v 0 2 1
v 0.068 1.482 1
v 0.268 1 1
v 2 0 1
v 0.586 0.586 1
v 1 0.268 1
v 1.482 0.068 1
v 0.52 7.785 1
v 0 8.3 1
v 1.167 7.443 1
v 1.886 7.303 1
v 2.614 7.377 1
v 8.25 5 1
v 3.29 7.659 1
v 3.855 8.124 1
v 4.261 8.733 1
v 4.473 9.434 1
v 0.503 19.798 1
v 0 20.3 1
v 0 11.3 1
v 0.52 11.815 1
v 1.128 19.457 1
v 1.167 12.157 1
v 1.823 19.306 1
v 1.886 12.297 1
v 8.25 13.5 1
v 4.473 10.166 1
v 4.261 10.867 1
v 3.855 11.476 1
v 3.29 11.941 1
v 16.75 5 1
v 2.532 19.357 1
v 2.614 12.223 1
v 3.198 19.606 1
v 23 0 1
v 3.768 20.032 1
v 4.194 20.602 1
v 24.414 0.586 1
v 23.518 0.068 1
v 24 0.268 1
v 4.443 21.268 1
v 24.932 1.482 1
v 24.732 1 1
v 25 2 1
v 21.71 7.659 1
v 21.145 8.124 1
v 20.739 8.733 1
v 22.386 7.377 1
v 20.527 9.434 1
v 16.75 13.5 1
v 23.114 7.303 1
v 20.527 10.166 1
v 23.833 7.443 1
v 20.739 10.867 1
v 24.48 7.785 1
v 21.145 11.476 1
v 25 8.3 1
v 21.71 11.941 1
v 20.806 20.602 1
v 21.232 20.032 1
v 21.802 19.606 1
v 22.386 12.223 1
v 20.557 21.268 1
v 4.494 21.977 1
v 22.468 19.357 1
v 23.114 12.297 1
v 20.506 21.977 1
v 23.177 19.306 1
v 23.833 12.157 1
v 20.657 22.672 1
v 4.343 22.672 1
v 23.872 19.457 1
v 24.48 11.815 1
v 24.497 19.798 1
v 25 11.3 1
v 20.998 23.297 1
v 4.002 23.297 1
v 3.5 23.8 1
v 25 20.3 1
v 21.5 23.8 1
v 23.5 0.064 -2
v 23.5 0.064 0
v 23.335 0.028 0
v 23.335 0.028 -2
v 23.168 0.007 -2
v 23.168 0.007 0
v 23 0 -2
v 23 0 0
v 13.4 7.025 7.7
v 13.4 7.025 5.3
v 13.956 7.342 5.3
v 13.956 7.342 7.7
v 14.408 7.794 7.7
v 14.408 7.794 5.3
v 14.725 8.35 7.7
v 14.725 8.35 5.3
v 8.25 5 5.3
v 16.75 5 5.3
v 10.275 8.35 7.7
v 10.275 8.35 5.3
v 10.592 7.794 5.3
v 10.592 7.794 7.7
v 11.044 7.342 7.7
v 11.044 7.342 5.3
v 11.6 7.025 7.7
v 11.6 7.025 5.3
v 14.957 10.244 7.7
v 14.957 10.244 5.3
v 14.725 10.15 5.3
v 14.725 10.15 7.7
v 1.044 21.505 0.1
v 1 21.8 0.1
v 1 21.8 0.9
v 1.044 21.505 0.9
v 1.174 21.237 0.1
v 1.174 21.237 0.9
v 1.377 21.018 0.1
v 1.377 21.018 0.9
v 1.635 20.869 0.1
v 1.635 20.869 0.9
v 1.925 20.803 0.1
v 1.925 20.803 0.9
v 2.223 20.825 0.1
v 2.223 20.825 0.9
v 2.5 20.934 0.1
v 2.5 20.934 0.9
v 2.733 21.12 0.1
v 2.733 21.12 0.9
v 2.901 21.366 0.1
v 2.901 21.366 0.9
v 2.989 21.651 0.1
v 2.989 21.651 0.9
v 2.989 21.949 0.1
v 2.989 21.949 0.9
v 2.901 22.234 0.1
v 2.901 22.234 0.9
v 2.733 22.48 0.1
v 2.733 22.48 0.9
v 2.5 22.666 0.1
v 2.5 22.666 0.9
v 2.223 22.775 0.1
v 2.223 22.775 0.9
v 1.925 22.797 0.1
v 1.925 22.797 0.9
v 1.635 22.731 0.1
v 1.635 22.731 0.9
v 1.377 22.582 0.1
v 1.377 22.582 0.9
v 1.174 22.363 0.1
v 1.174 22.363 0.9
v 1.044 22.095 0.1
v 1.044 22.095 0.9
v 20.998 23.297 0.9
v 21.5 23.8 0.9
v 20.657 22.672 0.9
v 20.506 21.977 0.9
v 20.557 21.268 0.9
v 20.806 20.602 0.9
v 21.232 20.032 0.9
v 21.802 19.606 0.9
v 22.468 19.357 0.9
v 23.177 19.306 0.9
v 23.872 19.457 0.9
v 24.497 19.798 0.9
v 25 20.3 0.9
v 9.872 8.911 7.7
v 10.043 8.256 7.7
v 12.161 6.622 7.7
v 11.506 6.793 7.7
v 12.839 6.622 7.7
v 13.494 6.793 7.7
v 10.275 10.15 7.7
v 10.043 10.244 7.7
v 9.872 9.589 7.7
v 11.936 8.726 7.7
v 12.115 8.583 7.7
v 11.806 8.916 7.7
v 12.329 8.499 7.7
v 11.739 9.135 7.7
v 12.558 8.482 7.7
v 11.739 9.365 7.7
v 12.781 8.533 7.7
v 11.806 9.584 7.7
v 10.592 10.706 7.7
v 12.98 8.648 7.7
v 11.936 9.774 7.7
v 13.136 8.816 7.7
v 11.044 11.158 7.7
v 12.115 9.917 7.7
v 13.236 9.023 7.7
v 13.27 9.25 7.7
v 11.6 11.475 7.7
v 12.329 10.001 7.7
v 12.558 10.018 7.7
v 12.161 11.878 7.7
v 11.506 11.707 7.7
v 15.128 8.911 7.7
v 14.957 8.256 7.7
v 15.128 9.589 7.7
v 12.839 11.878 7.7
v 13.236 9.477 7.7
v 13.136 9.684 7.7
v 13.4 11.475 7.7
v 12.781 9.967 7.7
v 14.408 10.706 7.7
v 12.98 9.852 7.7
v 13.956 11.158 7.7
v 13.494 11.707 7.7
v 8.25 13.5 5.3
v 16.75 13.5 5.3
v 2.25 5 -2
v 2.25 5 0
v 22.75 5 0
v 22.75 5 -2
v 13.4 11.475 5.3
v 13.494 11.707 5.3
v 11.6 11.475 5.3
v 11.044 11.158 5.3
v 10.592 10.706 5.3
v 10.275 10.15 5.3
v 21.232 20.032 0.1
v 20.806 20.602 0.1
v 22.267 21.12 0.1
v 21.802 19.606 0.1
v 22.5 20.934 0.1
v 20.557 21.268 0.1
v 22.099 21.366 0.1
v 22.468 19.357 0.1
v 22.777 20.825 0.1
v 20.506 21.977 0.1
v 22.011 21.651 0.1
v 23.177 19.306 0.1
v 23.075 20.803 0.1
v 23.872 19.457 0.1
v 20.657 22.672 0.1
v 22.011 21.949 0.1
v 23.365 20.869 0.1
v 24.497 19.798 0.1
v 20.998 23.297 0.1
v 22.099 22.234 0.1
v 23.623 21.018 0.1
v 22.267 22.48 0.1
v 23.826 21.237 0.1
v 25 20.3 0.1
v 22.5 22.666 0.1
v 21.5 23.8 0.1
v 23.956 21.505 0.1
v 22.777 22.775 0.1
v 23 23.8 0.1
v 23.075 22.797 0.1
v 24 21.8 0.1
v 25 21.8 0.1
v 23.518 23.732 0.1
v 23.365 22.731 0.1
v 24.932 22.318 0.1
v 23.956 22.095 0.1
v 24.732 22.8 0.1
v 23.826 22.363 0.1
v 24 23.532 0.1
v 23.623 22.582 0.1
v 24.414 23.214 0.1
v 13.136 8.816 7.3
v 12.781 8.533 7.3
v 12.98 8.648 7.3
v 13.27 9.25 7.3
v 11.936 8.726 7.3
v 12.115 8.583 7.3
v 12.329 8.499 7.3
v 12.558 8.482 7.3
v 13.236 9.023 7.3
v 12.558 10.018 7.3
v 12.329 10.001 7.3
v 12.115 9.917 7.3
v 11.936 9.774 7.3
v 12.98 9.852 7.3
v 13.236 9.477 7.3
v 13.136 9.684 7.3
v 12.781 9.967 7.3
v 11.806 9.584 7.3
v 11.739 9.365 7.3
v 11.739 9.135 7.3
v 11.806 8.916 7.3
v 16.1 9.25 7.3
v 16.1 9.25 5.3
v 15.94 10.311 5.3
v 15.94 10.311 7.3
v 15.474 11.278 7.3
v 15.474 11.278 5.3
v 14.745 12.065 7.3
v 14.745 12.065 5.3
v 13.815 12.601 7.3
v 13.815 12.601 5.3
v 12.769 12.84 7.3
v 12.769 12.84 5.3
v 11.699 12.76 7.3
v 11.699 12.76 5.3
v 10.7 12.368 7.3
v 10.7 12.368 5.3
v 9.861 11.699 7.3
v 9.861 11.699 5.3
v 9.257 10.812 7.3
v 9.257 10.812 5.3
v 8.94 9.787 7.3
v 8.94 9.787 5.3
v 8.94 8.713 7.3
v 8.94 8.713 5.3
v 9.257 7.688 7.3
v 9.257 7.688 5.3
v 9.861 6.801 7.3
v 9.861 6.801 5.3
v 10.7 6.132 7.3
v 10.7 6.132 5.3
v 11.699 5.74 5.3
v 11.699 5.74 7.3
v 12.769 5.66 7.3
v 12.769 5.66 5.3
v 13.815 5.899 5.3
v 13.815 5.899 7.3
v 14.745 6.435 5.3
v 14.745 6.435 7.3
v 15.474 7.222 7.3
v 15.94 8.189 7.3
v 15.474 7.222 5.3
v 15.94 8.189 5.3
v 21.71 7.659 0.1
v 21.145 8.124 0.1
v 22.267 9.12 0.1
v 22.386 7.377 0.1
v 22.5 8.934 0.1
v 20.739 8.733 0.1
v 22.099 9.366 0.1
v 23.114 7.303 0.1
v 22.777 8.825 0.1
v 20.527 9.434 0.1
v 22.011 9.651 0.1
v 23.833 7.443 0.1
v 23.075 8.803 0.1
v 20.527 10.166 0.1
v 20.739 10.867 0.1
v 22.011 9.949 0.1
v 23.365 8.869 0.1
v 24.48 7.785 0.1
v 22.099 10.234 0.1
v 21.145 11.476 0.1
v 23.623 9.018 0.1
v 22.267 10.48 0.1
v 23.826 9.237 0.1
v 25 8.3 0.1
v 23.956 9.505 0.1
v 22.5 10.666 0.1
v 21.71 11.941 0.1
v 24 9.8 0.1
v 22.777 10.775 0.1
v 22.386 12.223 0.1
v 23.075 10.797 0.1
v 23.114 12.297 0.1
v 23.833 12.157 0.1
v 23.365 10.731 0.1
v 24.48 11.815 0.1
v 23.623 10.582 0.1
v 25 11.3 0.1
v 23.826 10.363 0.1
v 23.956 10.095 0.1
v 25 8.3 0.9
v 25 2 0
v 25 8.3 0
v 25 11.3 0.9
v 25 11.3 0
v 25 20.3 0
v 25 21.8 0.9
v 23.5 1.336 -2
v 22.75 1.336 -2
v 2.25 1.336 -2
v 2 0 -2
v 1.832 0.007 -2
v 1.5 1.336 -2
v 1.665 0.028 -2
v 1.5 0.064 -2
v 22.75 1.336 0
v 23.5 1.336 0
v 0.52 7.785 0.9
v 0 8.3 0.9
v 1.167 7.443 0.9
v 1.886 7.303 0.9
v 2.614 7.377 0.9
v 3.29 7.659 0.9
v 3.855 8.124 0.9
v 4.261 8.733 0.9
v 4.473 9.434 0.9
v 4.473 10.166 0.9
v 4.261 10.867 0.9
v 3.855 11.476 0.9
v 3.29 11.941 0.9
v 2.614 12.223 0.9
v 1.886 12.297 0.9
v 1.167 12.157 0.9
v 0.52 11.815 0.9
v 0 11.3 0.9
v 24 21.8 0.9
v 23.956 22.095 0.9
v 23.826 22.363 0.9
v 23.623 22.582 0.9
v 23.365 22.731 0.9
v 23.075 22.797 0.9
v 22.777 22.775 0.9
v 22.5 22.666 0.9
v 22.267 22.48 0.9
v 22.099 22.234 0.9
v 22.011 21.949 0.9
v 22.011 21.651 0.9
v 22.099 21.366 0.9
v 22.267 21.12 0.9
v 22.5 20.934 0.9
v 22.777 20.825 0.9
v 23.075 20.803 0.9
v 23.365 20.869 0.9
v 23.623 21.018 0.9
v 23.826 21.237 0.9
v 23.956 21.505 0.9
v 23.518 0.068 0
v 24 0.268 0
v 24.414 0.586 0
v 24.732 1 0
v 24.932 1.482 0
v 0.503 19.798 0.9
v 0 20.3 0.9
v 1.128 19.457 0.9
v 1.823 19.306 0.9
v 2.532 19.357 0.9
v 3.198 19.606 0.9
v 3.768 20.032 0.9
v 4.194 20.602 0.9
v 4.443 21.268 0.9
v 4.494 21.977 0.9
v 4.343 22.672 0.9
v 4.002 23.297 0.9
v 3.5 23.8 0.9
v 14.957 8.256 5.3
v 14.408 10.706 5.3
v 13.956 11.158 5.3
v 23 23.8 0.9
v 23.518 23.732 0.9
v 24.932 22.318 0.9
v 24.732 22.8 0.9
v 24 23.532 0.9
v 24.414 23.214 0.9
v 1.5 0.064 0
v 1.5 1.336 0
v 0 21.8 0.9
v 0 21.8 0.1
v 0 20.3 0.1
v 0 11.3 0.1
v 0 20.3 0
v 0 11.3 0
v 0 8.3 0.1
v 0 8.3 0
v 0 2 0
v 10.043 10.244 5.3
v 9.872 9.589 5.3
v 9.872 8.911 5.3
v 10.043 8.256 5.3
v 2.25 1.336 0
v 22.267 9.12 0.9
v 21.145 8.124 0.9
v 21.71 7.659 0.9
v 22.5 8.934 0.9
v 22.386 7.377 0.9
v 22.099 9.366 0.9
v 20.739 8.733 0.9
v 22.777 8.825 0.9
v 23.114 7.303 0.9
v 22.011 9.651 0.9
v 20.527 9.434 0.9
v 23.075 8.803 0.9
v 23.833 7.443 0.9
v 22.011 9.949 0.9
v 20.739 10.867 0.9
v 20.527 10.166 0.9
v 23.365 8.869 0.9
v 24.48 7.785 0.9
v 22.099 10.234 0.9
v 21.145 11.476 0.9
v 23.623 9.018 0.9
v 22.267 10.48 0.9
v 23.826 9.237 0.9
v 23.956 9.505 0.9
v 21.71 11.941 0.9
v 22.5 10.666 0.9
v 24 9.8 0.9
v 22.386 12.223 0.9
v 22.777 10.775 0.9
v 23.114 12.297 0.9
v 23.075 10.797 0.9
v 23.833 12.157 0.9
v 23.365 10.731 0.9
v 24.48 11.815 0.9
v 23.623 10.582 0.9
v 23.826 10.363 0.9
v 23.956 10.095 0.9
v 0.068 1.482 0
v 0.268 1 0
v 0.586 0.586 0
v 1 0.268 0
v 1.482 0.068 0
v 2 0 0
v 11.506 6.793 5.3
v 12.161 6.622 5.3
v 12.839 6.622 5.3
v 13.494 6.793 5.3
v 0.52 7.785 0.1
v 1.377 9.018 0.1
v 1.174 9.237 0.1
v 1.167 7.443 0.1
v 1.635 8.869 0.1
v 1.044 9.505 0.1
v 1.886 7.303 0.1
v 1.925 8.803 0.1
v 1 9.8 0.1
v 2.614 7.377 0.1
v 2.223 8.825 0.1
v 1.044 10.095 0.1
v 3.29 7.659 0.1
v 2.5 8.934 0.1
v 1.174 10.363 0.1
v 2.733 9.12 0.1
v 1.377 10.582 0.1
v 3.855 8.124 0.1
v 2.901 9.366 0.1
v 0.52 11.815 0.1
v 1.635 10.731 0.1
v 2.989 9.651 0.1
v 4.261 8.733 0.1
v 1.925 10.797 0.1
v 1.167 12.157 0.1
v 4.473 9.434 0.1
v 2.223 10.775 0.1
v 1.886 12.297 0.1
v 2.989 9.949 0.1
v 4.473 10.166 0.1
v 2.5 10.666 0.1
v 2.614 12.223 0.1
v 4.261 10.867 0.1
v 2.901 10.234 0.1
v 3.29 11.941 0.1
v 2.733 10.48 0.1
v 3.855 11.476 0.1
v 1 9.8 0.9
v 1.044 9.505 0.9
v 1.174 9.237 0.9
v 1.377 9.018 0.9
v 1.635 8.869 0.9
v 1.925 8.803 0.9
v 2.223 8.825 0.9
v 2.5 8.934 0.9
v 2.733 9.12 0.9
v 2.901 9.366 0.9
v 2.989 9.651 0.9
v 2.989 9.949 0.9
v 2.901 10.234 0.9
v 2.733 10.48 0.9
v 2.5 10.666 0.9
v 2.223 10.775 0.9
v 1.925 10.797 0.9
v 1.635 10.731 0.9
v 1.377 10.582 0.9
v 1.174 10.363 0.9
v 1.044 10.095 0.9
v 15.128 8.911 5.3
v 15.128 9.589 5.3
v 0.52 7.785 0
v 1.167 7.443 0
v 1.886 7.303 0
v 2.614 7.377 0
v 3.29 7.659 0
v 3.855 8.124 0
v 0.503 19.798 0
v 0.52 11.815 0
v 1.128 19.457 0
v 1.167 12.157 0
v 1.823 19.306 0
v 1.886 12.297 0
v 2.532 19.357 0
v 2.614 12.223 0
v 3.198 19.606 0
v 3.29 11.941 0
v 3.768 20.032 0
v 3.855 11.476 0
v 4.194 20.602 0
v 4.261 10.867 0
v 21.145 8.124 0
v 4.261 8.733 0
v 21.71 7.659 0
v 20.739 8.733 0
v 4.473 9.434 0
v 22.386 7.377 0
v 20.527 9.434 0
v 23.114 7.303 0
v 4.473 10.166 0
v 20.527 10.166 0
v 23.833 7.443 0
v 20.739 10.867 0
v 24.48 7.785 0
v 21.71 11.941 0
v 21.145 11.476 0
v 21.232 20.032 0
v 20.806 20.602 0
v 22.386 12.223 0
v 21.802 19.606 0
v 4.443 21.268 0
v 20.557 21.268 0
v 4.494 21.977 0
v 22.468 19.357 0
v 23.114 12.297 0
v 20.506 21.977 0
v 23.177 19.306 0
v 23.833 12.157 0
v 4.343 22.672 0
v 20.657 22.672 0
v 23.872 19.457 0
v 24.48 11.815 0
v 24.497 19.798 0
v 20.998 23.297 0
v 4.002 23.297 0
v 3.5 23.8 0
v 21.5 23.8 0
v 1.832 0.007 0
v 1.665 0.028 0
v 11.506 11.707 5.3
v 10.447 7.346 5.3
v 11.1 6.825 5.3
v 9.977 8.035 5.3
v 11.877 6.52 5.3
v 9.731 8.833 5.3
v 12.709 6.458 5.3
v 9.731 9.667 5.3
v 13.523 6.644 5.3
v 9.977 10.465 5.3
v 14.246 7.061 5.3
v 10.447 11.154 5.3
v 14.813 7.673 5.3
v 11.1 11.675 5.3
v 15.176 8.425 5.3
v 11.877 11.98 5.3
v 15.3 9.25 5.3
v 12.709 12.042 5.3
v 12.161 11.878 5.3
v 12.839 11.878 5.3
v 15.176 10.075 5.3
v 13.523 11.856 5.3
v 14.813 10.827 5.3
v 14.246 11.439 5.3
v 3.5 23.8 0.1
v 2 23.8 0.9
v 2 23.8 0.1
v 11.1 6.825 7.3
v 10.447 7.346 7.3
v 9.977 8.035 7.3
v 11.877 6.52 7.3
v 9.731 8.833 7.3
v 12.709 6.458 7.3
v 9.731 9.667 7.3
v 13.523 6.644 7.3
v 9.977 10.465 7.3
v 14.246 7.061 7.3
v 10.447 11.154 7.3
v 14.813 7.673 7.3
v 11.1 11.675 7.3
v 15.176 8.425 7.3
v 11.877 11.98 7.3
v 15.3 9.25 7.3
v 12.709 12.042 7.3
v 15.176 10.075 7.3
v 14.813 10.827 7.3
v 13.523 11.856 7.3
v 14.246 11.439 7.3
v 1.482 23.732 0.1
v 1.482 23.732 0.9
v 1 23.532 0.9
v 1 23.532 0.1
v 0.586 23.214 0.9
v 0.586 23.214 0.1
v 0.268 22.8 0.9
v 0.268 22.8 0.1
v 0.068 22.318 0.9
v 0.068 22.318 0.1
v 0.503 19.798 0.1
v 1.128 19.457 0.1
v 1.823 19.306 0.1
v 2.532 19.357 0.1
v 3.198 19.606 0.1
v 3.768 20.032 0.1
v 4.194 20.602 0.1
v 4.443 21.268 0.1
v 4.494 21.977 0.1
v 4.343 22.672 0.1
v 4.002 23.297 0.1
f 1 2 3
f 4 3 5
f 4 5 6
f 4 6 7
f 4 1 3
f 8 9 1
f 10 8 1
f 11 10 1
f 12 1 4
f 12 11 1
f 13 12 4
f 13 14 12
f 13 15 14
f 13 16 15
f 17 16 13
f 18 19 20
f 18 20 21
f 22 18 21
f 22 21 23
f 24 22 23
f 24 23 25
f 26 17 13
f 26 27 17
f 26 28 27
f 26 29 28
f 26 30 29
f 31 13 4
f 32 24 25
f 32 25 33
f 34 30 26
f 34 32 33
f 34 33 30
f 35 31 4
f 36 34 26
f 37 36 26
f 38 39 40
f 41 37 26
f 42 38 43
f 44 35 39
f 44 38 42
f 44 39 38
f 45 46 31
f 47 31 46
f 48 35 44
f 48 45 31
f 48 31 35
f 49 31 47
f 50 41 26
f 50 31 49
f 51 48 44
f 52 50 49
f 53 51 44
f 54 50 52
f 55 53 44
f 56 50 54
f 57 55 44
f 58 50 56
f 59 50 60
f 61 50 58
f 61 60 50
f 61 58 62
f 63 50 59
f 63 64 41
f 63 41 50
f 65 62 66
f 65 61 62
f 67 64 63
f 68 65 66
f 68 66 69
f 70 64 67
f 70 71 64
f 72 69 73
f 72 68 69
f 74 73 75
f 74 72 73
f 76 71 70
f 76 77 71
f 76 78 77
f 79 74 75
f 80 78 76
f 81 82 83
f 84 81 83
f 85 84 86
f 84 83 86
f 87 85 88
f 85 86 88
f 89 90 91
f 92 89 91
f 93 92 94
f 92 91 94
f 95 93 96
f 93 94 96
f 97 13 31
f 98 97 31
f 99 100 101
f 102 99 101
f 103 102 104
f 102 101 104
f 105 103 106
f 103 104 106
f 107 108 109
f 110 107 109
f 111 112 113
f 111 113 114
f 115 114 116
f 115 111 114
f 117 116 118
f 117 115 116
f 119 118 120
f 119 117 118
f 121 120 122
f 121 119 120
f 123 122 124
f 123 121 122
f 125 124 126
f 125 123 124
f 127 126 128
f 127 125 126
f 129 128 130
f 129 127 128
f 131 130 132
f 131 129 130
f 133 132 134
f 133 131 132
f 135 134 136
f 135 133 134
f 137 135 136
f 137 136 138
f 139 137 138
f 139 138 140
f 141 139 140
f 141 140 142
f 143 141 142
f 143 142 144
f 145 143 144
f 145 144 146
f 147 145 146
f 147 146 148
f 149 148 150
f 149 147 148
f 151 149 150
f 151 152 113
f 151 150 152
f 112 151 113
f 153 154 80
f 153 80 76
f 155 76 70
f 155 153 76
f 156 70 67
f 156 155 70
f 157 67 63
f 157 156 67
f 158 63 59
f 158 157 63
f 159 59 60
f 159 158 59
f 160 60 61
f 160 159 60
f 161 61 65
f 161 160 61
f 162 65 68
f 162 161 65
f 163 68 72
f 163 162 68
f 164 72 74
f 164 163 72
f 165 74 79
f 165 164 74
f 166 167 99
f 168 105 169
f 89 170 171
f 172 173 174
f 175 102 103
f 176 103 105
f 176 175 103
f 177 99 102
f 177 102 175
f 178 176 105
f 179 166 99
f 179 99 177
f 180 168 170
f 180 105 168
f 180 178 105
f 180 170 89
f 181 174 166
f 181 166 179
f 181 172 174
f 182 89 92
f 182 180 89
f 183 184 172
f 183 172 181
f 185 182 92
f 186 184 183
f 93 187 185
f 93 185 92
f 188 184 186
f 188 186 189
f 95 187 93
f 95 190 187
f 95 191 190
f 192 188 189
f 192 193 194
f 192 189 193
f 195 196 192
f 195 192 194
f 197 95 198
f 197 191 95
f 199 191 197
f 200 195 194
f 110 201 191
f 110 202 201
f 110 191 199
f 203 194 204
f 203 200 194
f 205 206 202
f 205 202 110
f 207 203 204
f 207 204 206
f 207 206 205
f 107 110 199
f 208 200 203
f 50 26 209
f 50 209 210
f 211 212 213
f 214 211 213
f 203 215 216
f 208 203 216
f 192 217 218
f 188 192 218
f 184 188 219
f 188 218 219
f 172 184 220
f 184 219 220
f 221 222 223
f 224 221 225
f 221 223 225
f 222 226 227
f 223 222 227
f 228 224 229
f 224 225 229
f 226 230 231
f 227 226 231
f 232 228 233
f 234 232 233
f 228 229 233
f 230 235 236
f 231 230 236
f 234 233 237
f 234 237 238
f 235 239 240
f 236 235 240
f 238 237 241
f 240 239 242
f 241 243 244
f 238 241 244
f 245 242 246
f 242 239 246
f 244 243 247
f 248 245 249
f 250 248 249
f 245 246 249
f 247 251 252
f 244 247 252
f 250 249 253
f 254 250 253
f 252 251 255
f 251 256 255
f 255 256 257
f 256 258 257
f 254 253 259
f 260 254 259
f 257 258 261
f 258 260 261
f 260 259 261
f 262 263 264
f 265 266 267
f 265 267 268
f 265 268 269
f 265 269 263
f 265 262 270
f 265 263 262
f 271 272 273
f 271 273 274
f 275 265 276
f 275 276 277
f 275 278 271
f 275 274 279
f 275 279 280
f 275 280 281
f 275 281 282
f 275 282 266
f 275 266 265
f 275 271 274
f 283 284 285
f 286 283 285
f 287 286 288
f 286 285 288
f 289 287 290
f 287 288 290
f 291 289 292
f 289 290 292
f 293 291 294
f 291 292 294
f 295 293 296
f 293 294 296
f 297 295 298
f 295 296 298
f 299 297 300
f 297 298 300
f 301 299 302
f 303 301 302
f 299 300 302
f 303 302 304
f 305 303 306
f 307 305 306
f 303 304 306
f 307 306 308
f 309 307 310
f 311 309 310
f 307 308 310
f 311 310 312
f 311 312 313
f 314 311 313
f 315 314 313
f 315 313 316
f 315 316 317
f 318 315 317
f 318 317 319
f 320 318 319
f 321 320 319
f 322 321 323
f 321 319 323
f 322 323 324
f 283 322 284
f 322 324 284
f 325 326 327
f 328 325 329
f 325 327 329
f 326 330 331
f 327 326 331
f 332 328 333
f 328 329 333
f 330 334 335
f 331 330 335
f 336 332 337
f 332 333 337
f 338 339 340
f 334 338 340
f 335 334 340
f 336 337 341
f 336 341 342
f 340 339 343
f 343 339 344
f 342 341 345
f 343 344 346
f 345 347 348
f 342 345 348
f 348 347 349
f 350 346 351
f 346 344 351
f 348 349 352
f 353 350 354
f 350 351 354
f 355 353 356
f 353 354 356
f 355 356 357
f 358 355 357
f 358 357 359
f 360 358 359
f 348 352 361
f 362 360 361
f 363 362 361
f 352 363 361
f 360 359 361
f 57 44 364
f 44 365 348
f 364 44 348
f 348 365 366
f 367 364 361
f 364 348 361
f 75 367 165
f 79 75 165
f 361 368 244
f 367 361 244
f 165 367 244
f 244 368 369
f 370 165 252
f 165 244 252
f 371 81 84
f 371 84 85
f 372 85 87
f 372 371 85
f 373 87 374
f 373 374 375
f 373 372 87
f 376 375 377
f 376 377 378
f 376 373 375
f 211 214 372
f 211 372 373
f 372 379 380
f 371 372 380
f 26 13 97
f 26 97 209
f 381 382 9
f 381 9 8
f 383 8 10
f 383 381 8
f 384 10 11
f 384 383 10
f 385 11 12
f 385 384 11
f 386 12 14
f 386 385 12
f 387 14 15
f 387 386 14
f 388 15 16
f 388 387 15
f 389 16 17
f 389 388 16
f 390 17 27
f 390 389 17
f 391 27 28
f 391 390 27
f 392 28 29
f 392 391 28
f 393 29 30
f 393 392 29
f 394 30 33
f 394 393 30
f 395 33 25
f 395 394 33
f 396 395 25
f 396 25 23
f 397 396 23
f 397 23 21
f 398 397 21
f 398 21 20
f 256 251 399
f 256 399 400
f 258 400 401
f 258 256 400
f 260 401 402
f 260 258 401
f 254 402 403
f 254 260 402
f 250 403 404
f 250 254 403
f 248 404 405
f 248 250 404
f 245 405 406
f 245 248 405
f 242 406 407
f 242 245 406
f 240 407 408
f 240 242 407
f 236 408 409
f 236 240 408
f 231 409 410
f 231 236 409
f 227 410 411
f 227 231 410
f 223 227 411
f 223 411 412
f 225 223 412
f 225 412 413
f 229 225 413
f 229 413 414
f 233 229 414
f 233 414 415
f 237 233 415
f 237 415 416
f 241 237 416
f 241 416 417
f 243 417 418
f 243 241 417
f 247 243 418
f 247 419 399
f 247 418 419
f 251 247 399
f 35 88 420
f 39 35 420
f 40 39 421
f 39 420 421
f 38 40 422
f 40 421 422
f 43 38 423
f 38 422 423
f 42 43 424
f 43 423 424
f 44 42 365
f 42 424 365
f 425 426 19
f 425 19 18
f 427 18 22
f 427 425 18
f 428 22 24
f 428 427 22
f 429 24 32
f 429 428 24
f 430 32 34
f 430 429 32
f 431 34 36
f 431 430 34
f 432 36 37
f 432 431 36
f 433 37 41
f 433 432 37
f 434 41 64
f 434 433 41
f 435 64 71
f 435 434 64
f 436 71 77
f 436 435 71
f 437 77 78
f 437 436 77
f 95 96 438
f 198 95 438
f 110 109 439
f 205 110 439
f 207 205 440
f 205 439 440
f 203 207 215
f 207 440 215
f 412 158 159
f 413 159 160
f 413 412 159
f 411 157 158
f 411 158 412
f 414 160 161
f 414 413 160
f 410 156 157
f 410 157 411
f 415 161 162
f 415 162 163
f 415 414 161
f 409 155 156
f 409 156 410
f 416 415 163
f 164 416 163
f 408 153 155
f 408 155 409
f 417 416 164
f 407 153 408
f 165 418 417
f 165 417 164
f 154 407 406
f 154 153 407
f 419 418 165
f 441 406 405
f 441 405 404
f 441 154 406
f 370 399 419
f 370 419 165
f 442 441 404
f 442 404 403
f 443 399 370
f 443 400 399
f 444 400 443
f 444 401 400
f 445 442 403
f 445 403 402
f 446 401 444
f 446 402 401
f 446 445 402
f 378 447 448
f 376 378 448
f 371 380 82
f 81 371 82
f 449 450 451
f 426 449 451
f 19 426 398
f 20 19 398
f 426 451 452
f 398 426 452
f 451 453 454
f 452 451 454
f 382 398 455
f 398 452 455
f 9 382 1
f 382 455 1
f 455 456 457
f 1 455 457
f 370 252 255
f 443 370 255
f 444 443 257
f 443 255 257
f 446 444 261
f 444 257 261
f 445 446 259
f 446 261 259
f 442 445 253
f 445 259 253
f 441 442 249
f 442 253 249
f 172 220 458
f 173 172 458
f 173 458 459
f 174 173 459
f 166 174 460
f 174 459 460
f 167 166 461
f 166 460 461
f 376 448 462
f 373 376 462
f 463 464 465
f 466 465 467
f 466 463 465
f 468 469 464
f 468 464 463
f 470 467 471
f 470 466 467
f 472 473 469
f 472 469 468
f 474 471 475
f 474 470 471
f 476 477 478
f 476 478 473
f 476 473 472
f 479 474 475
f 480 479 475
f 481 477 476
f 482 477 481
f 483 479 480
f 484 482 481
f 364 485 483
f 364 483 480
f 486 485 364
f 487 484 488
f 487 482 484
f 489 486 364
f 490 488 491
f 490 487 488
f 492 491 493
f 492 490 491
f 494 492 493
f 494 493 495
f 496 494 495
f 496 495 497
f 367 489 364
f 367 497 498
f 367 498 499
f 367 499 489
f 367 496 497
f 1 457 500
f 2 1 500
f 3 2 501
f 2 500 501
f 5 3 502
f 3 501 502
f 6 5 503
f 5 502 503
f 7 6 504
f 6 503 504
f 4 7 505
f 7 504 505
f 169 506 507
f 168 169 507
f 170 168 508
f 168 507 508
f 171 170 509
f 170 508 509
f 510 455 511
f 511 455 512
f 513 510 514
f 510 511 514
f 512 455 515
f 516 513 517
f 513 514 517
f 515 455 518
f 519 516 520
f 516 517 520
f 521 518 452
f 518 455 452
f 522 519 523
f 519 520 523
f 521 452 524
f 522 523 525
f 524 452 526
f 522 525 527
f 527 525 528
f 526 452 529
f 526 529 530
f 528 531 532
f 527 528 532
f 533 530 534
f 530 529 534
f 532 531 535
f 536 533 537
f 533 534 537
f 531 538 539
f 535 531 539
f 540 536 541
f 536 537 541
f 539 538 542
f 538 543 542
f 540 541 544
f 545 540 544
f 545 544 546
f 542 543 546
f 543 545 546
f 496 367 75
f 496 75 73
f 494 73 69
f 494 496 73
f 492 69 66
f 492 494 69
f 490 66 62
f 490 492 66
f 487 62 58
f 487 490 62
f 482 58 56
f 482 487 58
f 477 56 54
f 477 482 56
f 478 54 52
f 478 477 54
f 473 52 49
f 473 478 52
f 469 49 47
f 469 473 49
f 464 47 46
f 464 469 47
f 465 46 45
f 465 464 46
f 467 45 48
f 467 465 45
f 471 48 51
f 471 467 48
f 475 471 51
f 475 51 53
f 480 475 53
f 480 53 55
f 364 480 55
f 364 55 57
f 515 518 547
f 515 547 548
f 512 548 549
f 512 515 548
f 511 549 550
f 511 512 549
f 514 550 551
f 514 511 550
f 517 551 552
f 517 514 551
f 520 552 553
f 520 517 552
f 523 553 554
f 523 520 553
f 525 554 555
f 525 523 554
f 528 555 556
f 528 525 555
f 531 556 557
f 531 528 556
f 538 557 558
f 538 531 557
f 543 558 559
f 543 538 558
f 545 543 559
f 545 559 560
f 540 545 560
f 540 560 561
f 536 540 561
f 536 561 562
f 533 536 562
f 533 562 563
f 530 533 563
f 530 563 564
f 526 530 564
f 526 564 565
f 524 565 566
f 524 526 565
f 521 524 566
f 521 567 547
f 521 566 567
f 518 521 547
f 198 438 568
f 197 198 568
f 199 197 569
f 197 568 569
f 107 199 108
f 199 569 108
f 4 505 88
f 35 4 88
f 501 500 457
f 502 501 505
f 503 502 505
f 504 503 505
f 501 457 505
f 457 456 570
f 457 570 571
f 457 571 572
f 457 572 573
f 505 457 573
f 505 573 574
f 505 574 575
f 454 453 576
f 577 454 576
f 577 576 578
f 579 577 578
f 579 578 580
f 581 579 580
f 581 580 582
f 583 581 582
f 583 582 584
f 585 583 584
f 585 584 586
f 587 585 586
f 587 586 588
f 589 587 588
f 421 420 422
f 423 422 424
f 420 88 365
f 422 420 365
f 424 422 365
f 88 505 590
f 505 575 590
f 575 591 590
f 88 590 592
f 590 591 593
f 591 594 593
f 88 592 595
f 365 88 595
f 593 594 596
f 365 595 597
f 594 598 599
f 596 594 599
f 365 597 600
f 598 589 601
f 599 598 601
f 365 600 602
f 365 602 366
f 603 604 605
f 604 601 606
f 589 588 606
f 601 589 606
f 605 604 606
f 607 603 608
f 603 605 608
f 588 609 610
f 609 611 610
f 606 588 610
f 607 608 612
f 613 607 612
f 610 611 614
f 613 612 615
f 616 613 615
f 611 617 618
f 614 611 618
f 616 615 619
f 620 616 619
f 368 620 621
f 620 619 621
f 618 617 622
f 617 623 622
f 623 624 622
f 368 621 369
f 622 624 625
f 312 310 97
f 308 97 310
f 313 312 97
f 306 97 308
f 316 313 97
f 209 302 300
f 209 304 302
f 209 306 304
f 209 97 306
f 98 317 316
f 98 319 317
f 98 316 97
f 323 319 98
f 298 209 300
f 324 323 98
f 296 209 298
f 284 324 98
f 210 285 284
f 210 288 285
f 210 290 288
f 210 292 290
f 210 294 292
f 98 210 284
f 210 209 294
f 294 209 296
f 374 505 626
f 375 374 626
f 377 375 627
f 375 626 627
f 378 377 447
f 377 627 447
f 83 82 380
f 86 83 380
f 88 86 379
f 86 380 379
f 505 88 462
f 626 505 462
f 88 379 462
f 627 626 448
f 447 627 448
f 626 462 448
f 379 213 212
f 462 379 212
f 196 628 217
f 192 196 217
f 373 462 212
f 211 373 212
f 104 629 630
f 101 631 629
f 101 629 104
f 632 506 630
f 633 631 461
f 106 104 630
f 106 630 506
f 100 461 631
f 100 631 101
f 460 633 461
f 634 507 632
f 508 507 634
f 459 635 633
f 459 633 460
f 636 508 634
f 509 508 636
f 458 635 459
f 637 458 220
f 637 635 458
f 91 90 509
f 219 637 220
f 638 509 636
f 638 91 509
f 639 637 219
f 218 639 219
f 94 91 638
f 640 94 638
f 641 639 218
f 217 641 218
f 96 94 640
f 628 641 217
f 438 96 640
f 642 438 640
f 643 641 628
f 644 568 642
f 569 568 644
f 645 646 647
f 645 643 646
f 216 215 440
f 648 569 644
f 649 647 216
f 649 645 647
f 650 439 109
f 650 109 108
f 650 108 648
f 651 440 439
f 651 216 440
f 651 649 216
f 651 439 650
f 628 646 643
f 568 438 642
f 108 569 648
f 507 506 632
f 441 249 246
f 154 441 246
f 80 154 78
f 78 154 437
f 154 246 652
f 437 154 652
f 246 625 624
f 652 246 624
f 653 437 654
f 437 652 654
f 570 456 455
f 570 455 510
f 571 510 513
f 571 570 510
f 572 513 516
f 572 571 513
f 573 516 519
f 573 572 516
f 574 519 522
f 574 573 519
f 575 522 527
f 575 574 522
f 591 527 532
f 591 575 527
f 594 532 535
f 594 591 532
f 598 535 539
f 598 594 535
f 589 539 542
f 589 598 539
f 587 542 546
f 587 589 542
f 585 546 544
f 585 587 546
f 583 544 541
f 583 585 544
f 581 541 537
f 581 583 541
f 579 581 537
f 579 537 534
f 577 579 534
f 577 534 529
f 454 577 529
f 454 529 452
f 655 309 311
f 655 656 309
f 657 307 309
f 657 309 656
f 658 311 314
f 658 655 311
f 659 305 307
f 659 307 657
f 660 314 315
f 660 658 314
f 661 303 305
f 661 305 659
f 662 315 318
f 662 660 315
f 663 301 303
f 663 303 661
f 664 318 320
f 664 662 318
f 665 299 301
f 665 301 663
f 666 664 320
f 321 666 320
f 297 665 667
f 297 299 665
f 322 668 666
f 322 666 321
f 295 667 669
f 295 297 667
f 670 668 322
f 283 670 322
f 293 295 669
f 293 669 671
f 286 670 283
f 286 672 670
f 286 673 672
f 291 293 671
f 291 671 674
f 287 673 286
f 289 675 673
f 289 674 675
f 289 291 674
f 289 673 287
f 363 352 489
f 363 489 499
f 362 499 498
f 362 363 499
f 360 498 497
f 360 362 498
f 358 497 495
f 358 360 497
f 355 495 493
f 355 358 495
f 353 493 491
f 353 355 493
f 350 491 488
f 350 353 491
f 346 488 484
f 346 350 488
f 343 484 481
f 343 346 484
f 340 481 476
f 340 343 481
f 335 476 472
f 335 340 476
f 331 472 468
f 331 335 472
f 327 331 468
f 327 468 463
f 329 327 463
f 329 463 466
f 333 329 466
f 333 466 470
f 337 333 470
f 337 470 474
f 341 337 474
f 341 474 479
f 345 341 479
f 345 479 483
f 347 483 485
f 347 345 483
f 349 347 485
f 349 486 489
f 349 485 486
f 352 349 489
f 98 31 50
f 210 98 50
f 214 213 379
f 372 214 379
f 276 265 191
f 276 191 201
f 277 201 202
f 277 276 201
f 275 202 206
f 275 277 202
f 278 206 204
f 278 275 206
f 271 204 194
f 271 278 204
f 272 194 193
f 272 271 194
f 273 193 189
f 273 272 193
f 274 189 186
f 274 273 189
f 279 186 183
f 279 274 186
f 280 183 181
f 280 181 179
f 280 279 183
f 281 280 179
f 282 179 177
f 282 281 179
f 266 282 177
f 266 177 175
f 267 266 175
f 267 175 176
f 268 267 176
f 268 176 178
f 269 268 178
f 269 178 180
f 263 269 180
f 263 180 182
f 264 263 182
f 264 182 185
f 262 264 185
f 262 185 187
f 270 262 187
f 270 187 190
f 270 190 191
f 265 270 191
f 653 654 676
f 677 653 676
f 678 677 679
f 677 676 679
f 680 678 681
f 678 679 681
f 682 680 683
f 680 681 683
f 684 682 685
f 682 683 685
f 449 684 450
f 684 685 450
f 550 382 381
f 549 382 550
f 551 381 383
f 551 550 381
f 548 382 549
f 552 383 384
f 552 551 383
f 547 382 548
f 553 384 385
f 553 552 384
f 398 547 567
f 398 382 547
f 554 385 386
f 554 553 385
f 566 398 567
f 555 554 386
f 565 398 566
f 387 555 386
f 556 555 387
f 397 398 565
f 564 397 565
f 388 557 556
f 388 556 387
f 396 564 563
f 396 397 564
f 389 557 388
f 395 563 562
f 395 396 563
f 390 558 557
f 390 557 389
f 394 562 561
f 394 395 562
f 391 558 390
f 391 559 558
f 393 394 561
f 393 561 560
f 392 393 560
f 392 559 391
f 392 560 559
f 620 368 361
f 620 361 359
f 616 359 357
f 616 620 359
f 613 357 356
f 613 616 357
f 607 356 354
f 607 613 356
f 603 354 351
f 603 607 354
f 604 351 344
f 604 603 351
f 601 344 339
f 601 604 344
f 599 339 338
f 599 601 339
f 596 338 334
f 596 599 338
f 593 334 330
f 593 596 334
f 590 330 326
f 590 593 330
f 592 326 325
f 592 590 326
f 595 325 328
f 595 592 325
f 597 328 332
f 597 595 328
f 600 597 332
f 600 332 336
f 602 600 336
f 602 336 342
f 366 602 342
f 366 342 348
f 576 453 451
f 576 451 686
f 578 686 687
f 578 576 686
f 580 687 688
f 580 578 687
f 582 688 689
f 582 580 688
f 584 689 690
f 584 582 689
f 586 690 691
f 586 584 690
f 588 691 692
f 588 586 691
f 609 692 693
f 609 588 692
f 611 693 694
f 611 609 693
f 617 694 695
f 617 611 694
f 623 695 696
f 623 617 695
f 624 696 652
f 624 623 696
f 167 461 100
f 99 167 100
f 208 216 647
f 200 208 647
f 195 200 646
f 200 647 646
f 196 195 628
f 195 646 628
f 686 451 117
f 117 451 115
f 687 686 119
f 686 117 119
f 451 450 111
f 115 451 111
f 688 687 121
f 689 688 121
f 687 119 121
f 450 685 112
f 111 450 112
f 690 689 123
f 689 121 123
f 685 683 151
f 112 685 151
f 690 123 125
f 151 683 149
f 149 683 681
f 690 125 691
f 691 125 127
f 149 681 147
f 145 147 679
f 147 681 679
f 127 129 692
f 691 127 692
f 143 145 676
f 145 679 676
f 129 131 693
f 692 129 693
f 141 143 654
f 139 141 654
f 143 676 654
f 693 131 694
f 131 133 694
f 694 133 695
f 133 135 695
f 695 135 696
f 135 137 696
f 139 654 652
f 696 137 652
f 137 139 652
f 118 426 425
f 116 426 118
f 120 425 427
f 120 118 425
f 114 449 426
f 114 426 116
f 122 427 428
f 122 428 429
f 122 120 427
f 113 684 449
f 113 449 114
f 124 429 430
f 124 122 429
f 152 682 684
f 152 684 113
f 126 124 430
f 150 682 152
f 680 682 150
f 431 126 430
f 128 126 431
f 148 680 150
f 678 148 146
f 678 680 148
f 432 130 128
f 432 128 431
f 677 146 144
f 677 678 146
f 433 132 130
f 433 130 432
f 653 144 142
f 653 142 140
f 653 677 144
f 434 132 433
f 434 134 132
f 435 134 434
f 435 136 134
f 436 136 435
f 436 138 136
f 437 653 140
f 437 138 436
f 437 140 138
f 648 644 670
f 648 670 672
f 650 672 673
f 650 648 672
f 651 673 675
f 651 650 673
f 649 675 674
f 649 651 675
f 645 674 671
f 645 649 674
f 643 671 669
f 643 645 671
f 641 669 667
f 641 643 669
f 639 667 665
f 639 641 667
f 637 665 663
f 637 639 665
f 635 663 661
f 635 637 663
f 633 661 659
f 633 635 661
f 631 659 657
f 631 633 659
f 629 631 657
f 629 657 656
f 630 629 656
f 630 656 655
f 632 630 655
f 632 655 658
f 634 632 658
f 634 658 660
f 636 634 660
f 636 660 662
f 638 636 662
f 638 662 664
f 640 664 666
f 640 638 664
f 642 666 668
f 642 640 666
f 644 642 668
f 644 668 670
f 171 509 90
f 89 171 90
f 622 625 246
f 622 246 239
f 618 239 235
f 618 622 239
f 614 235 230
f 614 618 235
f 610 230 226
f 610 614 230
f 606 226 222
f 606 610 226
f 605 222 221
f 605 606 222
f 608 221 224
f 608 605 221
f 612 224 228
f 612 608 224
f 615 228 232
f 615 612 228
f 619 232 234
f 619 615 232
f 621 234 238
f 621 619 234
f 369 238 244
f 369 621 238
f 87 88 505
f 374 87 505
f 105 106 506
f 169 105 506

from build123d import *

# Parameters (mm, degrees)
SKETCH_1_R          = 1
EXTRUDE_1_DEPTH     = 1
CUT_EXTRUDE_START   = -0.1
CUT_EXTRUDE_1_DEPTH = 0.1
CUT_EXTRUDE_2_DEPTH = 0.1
SKETCH_2_W          = 8.5
SKETCH_2_H          = 8.5
EXTRUDE_2_DEPTH     = 4.3
SKETCH_3_R          = 3.6
SKETCH_3_R_2        = 2.8
EXTRUDE_3_DEPTH     = 2
SKETCH_4_R          = 0.77
EXTRUDE_4_DEPTH     = 2.4
SKETCH_5_R          = 0.77
EXTRUDE_5_DEPTH     = 2
EXTRUDE_6_DEPTH     = 2


with BuildPart() as part:
    # 草图1 → 凸台-拉伸1 (new body)
    with BuildSketch(Plane.XY):
        with BuildLine():
            Line((2, 0), (23, 0))
            ThreePointArc((23, 0), (24.414213562, 0.585786438), (25, 2))
            Line((25, 2), (25, 21.8))
            ThreePointArc((25, 21.8), (24.414213562, 23.214213562), (23, 23.8))
            Line((23, 23.8), (2, 23.8))
            ThreePointArc((2, 23.8), (0.585786438, 23.214213562), (0, 21.8))
            Line((0, 21.8), (0, 2))
            ThreePointArc((0, 2), (0.585786438, 0.585786438), (2, 0))
        make_face()
        with Locations((23, 21.8)):
            Circle(SKETCH_1_R, mode=Mode.SUBTRACT)
        with Locations(Location((2, 21.8, 0), (0, 0, 180))):
            Circle(SKETCH_1_R, mode=Mode.SUBTRACT)
        with Locations(Location((2, 9.8, 0), (0, 0, 180))):
            Circle(SKETCH_1_R, mode=Mode.SUBTRACT)
        with Locations((23, 9.8)):
            Circle(SKETCH_1_R, mode=Mode.SUBTRACT)
    extrude(amount=EXTRUDE_1_DEPTH)

    # 草图6 → 切除-拉伸1 (cut)
    with BuildSketch(Plane.XY.offset(1).offset(CUT_EXTRUDE_START)):
        with BuildLine():
            Line((25, 20.3), (25, 21.8))
            ThreePointArc((25, 21.8), (24.414213562, 23.214213562), (23, 23.8))
            Line((23, 23.8), (21.5, 23.8))
            ThreePointArc((21.5, 23.8), (21.232233047, 20.032233047), (25, 20.3))
        make_face()
        with BuildLine():
            Line((0, 11.3), (0, 8.3))
            ThreePointArc((0, 8.3), (4.5, 9.8), (0, 11.3))
        make_face()
        with BuildLine():
            Line((3.5, 23.8), (2, 23.8))
            ThreePointArc((2, 23.8), (0.585786438, 23.214213562), (0, 21.8))
            Line((0, 21.8), (0, 20.3))
            ThreePointArc((0, 20.3), (3.767766953, 20.032233047), (3.5, 23.8))
        make_face()
        with BuildLine():
            Line((25, 8.3), (25, 11.3))
            ThreePointArc((25, 11.3), (20.5, 9.8), (25, 8.3))
        make_face()
    extrude(amount=CUT_EXTRUDE_1_DEPTH, mode=Mode.SUBTRACT)

    # 草图7 → 切除-拉伸2 (cut)
    with BuildSketch(Plane(origin=(0, 0, 0), x_dir=(-1, 0, 0), z_dir=(0, 0, -1))):
        with BuildLine():
            Line((-3.5, 23.8), (-2, 23.8))
            ThreePointArc((-2, 23.8), (-0.585786438, 23.214213562), (0, 21.8))
            Line((0, 21.8), (0, 20.3))
            ThreePointArc((0, 20.3), (-3.767766953, 20.032233047), (-3.5, 23.8))
        make_face()
        with BuildLine():
            Line((0, 11.3), (0, 8.3))
            ThreePointArc((0, 8.3), (-4.5, 9.8), (0, 11.3))
        make_face()
        with BuildLine():
            Line((-25, 8.3), (-25, 11.3))
            ThreePointArc((-25, 11.3), (-20.5, 9.8), (-25, 8.3))
        make_face()
        with BuildLine():
            Line((-23, 23.8), (-21.5, 23.8))
            ThreePointArc((-21.5, 23.8), (-21.232233047, 20.032233047), (-25, 20.3))
            Line((-25, 20.3), (-25, 21.8))
            ThreePointArc((-25, 21.8), (-24.414213562, 23.214213562), (-23, 23.8))
        make_face()
    extrude(amount=-CUT_EXTRUDE_2_DEPTH, mode=Mode.SUBTRACT)

    # 草图2 → 凸台-拉伸2 (add)
    with BuildSketch(Plane.XY.offset(1)):
        with Locations((12.5, 9.25)):
            Rectangle(SKETCH_2_W, SKETCH_2_H)
    extrude(amount=EXTRUDE_2_DEPTH)

    # 草图3 → 凸台-拉伸3 (add)
    with BuildSketch(Plane.XY.offset(5.3)):
        with Locations((12.5, 9.25)):
            Circle(SKETCH_3_R)
        with Locations((12.5, 9.25)):
            Circle(SKETCH_3_R_2, mode=Mode.SUBTRACT)
    extrude(amount=EXTRUDE_3_DEPTH)

    # 草图4 → 凸台-拉伸4 (add)
    with BuildSketch(Plane.XY.offset(5.3)):
        with BuildLine():
            Line((11.50625, 11.706615749), (11.6, 11.474859546))
            ThreePointArc((11.6, 11.474859546), (10.802943725, 10.947056275), (10.275140454, 10.15))
            Line((10.275140454, 10.15), (10.043384251, 10.24375))
            ThreePointArc((10.043384251, 10.24375), (9.85, 9.25), (10.043384251, 8.25625))
            Line((10.043384251, 8.25625), (10.275140454, 8.35))
            ThreePointArc((10.275140454, 8.35), (10.802943725, 7.552943725), (11.6, 7.025140454))
            Line((11.6, 7.025140454), (11.50625, 6.793384251))
            ThreePointArc((11.50625, 6.793384251), (12.5, 6.6), (13.49375, 6.793384251))
            Line((13.49375, 6.793384251), (13.4, 7.025140454))
            ThreePointArc((13.4, 7.025140454), (14.197056275, 7.552943725), (14.724859546, 8.35))
            Line((14.724859546, 8.35), (14.956615749, 8.25625))
            ThreePointArc((14.956615749, 8.25625), (15.15, 9.25), (14.956615749, 10.24375))
            Line((14.956615749, 10.24375), (14.724859546, 10.15))
            ThreePointArc((14.724859546, 10.15), (14.197056275, 10.947056275), (13.4, 11.474859546))
            Line((13.4, 11.474859546), (13.49375, 11.706615749))
            ThreePointArc((13.49375, 11.706615749), (12.5, 11.9), (11.50625, 11.706615749))
        make_face()
        with Locations((12.5, 9.25)):
            Circle(SKETCH_4_R, mode=Mode.SUBTRACT)
    extrude(amount=EXTRUDE_4_DEPTH)

    # 草图5 → 凸台-拉伸5 (add)
    with BuildSketch(Plane.XY.offset(5.3)):
        with Locations((12.5, 9.25)):
            Circle(SKETCH_5_R)
    extrude(amount=EXTRUDE_5_DEPTH)


with BuildPart() as body_2:
    # 草图8 → 凸台-拉伸6 (new body)
    with BuildSketch(Plane(origin=(0, 0, 0), x_dir=(-1, 0, 0), z_dir=(0, 0, -1))):
        with BuildLine():
            ThreePointArc((-23.5, 0.063508327), (-23.252008585, 0.015940607), (-23, 0))
            Line((-23, 0), (-12.5, 0))
            Line((-12.5, 0), (-12.5, 5))
            Line((-12.5, 5), (-22.75, 5))
            Line((-22.75, 5), (-22.75, 1.335560583))
            Line((-22.75, 1.335560583), (-23.5, 1.335560583))
            Line((-23.5, 1.335560583), (-23.5, 0.063508327))
        make_face()
        with BuildLine():
            Line((-12.5, 5), (-12.5, 0))
            Line((-12.5, 0), (-2, 0))
            ThreePointArc((-2, 0), (-1.747991415, 0.015940607), (-1.5, 0.063508327))
            Line((-1.5, 0.063508327), (-1.5, 1.335560583))
            Line((-1.5, 1.335560583), (-2.25, 1.335560583))
            Line((-2.25, 1.335560583), (-2.25, 5))
            Line((-2.25, 5), (-12.5, 5))
        make_face()
    extrude(amount=EXTRUDE_6_DEPTH)


solid = Compound([part.part, body_2.part])
